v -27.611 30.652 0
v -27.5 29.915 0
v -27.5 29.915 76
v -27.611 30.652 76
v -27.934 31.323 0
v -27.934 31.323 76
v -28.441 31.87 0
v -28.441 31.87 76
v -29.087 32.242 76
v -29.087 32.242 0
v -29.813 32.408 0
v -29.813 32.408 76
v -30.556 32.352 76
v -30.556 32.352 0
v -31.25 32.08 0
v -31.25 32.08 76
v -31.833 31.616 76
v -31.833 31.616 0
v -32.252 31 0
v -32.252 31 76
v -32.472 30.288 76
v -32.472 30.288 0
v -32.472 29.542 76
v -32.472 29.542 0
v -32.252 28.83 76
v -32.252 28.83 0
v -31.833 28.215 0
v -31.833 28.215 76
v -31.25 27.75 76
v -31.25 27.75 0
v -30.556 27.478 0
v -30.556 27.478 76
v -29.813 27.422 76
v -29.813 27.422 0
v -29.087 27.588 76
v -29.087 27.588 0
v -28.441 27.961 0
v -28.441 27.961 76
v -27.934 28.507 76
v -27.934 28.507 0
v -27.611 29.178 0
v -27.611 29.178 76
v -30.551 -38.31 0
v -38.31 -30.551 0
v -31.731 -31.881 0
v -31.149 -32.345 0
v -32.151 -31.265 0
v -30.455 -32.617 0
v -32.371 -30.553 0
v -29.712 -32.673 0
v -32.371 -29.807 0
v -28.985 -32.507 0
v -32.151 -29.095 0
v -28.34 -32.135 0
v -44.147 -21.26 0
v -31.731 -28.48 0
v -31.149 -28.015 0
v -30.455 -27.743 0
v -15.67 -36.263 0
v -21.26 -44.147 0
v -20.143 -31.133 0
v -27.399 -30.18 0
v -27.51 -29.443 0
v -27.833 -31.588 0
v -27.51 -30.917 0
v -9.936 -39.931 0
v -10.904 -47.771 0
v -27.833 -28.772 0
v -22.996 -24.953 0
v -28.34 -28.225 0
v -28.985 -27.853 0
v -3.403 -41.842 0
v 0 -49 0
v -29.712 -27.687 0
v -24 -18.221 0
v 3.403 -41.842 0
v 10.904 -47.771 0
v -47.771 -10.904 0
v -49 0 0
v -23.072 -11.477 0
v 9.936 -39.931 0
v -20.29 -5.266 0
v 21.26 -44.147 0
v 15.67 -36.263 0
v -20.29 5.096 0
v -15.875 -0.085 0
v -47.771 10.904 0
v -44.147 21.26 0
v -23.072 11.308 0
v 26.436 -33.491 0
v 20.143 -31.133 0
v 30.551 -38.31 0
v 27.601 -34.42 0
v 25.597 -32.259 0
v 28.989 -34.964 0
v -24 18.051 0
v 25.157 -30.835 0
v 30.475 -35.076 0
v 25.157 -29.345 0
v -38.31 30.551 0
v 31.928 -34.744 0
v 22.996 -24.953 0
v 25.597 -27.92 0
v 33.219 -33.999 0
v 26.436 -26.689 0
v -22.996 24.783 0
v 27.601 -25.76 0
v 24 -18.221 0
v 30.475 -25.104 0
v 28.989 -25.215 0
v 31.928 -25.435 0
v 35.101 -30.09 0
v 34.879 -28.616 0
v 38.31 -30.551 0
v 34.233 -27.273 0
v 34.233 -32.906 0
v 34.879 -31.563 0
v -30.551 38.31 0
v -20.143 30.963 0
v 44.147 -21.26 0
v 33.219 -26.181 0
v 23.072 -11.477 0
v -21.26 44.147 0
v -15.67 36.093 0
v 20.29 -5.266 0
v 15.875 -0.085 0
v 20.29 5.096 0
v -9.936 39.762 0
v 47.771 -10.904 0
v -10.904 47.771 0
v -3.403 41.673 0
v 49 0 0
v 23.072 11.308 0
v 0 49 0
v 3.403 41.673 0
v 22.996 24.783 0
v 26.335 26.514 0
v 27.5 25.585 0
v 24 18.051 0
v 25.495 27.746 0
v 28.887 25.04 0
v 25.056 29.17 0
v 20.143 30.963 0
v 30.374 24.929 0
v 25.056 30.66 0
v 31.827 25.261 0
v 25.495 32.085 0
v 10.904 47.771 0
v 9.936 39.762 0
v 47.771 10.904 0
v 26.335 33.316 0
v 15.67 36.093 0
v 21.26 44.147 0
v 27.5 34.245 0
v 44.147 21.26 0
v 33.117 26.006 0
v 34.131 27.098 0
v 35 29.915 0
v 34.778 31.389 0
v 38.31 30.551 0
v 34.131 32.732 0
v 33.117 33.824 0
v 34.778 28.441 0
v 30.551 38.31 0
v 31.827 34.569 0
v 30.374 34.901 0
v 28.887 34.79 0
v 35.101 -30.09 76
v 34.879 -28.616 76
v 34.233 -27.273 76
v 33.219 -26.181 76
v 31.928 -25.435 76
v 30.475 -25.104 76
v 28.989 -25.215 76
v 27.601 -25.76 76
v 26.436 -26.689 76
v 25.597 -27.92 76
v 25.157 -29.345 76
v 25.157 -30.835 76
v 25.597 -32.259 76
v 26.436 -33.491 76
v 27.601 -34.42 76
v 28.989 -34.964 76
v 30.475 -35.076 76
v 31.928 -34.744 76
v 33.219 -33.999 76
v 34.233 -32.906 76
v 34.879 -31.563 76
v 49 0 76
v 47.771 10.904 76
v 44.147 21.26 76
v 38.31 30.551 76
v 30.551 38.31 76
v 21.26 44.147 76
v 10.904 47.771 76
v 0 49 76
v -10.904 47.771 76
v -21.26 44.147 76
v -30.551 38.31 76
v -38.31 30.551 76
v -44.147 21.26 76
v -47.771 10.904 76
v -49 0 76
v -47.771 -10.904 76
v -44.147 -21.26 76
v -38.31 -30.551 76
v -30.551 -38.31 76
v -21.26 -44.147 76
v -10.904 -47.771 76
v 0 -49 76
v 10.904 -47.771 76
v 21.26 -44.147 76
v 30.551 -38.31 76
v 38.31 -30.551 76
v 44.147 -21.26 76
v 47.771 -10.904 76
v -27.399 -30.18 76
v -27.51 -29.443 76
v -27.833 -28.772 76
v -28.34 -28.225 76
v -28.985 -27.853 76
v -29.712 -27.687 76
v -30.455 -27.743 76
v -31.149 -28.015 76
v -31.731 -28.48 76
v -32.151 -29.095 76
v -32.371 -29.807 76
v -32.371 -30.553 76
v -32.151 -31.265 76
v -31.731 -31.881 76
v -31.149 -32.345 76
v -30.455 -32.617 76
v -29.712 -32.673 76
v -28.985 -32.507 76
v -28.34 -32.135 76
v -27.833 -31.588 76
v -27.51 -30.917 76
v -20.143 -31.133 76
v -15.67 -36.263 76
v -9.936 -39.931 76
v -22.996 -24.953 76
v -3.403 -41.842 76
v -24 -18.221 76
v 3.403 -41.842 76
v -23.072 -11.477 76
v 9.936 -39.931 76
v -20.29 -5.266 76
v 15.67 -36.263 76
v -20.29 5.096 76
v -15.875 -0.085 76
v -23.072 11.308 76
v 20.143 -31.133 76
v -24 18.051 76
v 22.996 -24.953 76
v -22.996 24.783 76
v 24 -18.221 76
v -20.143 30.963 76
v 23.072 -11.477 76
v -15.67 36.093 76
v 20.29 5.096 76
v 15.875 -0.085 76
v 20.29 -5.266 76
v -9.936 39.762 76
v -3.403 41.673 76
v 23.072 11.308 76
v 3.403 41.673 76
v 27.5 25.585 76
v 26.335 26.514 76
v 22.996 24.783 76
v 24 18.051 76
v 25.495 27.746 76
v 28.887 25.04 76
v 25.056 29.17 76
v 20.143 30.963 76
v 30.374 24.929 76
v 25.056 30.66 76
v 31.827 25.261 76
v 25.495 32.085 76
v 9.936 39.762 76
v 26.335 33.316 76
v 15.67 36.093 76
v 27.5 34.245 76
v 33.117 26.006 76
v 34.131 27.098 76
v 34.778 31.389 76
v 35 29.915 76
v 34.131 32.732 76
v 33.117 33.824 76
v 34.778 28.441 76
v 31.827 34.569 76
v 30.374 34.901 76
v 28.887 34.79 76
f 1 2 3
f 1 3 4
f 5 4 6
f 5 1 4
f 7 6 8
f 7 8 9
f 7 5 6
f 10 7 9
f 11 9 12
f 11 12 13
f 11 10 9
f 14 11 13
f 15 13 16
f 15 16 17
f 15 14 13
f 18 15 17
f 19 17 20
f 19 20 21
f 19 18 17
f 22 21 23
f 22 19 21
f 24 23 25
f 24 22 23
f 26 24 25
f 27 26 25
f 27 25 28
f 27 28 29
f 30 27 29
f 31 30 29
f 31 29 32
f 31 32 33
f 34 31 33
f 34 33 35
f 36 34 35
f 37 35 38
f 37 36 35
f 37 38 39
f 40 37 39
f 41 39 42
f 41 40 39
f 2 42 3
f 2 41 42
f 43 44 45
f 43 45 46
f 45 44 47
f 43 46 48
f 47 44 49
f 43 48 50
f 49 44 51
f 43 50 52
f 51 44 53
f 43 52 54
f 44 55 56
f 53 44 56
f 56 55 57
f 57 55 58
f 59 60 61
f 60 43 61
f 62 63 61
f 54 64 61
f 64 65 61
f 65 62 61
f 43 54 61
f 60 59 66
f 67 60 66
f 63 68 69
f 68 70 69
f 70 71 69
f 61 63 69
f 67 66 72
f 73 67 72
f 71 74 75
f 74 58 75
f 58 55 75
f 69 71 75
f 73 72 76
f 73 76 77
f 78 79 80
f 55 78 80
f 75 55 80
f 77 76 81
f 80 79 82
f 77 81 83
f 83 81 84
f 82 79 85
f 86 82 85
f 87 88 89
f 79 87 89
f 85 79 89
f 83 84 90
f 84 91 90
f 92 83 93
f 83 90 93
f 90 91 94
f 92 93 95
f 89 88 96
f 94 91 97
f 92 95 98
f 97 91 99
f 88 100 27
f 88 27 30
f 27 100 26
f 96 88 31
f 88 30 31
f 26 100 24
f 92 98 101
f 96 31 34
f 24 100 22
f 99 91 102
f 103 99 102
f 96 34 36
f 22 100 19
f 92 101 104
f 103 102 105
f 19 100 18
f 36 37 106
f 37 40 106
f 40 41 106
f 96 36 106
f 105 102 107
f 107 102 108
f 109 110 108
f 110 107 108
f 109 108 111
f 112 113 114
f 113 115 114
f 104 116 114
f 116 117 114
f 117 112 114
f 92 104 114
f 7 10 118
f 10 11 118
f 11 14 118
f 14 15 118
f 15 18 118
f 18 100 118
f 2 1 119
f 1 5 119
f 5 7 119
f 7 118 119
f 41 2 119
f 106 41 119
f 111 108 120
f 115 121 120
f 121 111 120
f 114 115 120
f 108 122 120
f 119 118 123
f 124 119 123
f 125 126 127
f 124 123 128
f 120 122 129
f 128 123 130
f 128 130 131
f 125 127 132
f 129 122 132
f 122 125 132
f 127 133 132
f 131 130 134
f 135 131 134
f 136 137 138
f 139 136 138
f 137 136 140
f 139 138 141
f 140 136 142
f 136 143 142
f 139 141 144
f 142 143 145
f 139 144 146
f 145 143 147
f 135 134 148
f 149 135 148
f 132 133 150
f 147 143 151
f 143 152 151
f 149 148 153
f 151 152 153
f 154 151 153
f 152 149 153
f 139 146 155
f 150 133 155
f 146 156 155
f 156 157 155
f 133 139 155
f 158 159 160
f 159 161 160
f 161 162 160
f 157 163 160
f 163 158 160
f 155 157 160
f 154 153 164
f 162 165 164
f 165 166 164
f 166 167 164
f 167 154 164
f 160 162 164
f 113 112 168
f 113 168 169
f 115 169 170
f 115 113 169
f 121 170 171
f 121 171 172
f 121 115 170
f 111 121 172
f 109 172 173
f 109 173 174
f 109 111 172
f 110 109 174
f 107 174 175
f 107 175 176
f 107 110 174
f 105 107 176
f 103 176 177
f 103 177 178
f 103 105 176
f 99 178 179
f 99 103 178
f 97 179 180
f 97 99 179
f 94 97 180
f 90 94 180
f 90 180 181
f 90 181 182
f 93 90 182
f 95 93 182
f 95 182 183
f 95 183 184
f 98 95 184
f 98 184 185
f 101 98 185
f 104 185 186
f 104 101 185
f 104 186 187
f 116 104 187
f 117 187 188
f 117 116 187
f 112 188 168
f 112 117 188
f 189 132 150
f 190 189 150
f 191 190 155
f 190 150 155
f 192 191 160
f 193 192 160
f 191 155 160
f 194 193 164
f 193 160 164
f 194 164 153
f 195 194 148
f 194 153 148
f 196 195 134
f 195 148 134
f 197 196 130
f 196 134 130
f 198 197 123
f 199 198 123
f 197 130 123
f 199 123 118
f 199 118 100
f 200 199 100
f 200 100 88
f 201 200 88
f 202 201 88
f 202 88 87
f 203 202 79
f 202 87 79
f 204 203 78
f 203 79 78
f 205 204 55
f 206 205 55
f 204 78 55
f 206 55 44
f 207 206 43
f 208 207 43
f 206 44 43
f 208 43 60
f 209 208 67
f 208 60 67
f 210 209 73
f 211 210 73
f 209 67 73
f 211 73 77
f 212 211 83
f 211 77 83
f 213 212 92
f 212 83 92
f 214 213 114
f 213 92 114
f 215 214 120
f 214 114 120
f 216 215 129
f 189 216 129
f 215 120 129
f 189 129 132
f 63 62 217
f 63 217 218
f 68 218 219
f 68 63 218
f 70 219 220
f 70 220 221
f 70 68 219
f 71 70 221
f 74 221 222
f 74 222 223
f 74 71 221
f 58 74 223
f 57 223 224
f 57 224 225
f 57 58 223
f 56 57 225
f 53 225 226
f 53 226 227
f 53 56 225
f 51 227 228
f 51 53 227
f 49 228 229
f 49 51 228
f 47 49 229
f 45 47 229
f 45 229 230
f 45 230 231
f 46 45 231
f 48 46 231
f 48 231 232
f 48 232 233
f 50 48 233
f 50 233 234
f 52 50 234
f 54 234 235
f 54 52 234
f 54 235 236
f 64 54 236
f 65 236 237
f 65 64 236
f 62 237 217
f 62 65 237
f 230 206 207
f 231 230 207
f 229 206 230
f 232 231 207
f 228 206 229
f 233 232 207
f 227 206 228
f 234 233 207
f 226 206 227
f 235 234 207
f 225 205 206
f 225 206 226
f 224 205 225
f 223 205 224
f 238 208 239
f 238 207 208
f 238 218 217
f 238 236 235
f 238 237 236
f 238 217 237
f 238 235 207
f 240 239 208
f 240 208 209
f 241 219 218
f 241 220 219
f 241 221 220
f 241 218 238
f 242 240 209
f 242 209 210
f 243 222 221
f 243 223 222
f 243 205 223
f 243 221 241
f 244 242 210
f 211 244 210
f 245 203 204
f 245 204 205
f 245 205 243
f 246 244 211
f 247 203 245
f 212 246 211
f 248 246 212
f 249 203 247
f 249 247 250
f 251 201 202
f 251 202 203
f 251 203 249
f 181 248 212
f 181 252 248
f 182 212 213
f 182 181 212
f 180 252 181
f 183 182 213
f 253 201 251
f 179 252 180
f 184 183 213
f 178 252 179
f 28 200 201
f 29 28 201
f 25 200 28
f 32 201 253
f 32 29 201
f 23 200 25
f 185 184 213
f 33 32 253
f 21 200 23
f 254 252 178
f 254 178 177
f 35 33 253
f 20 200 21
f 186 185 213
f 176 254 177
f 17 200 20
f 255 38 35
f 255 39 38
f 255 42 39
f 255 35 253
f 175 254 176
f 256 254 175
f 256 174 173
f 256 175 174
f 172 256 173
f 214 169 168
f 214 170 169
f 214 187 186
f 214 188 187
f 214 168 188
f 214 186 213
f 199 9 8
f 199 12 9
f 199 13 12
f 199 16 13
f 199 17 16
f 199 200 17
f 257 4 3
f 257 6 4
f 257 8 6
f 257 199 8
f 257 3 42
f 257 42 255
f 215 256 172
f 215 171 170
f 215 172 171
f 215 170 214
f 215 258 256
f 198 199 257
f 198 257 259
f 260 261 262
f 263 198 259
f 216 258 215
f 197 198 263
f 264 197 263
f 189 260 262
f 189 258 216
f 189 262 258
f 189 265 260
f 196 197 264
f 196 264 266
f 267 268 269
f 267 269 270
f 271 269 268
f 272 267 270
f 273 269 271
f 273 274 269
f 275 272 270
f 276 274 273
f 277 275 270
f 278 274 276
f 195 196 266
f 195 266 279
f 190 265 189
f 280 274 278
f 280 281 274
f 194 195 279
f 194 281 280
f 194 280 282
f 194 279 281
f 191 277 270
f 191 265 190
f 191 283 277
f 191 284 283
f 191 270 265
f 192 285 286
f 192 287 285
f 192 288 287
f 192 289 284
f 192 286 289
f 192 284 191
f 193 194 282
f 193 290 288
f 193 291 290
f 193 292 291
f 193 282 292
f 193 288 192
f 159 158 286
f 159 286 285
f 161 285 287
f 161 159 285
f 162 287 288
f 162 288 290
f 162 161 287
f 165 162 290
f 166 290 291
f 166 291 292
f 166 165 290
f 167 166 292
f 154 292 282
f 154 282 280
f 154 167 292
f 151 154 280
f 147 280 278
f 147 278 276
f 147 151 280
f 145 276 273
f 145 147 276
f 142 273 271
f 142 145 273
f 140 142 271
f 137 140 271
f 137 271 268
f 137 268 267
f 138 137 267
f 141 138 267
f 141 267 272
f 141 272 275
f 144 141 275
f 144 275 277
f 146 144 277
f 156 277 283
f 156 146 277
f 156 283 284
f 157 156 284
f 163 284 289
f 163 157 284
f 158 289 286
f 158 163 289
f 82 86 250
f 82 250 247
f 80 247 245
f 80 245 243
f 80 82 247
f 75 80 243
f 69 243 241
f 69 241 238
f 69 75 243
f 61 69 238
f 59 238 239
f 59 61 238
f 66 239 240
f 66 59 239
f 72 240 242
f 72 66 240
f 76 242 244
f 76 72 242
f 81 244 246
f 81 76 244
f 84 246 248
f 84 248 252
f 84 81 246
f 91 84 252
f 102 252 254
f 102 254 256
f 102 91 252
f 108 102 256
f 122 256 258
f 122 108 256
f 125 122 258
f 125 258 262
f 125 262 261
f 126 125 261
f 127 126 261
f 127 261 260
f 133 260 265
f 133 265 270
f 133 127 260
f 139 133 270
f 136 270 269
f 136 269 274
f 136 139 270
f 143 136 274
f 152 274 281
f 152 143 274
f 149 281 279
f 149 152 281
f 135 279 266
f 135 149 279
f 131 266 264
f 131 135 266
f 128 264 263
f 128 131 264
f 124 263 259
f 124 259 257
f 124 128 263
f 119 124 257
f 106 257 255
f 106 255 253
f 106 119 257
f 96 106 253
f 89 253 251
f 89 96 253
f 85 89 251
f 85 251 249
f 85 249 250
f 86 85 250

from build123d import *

# Parameters (mm, degrees)
SKETCH1_R           = 49
SKETCH1_R_2         = 2.5
SKETCH1_R_3         = 5
BOSS_EXTRUDE1_DEPTH = 76


with BuildPart() as part:
    # Sketch1 → Boss-Extrude1 (new body)
    with BuildSketch(Plane.XY):
        Circle(SKETCH1_R)
        with Locations((-30, 29.915097225)):
            Circle(SKETCH1_R_2, mode=Mode.SUBTRACT)
        with Locations((30, 29.915097225)):
            Circle(SKETCH1_R_3, mode=Mode.SUBTRACT)
        with Locations((-29.89855214, -30.18007542)):
            Circle(SKETCH1_R_2, mode=Mode.SUBTRACT)
        with Locations((30.10144786, -30.08971898)):
            Circle(SKETCH1_R_3, mode=Mode.SUBTRACT)
        with BuildLine():
            ThreePointArc((-15.874507866, -0.084902775), (0, -42.084902775), (15.874507866, -0.084902775))
            ThreePointArc((15.874507866, -0.084902775), (0, 41.915097225), (-15.874507866, -0.084902775))
        make_face(mode=Mode.SUBTRACT)
    extrude(amount=BOSS_EXTRUDE1_DEPTH)


solid = part.part
